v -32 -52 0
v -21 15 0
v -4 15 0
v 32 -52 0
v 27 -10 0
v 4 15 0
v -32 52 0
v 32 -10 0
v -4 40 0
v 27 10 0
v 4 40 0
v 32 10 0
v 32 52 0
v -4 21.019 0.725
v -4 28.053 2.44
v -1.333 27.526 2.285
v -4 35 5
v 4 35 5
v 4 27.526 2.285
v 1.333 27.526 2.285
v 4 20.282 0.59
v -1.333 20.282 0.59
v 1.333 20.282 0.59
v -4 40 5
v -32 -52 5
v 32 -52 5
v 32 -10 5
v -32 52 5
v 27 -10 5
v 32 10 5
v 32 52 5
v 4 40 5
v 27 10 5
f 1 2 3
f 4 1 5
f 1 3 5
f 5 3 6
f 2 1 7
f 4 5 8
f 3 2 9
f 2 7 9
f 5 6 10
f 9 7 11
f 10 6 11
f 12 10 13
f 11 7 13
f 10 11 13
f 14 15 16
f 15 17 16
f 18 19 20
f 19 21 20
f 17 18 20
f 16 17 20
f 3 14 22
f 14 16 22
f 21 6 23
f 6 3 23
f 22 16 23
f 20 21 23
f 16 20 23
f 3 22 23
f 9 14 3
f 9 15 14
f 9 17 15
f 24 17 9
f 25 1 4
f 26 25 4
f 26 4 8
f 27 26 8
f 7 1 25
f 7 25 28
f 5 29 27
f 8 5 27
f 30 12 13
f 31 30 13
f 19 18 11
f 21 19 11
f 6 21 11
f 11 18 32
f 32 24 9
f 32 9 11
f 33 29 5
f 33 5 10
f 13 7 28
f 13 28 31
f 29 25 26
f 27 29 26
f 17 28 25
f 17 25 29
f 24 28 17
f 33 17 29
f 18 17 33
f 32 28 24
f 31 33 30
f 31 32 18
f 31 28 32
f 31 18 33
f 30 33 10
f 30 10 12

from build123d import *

# Parameters (mm, degrees)
F0_W     = 64
F0_H     = 104
F1_DEPTH = 5
F2_W     = 5
F2_H     = 20
F3_DEPTH = 25
F5_W     = 8
F5_H     = 25
F6_DEPTH = 25
F8_DEPTH = 25


with BuildPart() as f1:
    # F0 (on Top) → F1 (new body)
    with BuildSketch(Plane.XY):
        Rectangle(F0_W, F0_H)
    extrude(amount=F1_DEPTH)

    # F2 (on face) → F3 (cut)
    with BuildSketch(Plane.XY.offset(5)):
        with Locations((29.5, 0)):
            Rectangle(F2_W, F2_H)
    extrude(amount=-F3_DEPTH, mode=Mode.SUBTRACT)

    # F5 (on face) → F6 (cut)
    with BuildSketch(Plane.XY.offset(5)):
        with Locations((0, 27.5)):
            Rectangle(F5_W, F5_H)
    extrude(amount=-F6_DEPTH, mode=Mode.SUBTRACT)

    # F7 (on face) → F8 (join)
    with BuildSketch(Plane(origin=(4, 0, 0), x_dir=(0, -1, 0), z_dir=(-1, 0, 0))):
        with BuildLine():
            Line((-15, 5), (-35, 5))
            add(Edge.make_bspline(
                [(-35, 5), (-27.9895598193, 1.8046537073), (-18.7225920955, 0.0081415234), (-15, 0)],
                knots=[0, 0, 0, 0, 20.6155281281, 20.6155281281, 20.6155281281, 20.6155281281], degree=3))
            Line((-15, 0), (-15, 5))
        make_face()
    extrude(amount=F8_DEPTH)


solid = f1.part
